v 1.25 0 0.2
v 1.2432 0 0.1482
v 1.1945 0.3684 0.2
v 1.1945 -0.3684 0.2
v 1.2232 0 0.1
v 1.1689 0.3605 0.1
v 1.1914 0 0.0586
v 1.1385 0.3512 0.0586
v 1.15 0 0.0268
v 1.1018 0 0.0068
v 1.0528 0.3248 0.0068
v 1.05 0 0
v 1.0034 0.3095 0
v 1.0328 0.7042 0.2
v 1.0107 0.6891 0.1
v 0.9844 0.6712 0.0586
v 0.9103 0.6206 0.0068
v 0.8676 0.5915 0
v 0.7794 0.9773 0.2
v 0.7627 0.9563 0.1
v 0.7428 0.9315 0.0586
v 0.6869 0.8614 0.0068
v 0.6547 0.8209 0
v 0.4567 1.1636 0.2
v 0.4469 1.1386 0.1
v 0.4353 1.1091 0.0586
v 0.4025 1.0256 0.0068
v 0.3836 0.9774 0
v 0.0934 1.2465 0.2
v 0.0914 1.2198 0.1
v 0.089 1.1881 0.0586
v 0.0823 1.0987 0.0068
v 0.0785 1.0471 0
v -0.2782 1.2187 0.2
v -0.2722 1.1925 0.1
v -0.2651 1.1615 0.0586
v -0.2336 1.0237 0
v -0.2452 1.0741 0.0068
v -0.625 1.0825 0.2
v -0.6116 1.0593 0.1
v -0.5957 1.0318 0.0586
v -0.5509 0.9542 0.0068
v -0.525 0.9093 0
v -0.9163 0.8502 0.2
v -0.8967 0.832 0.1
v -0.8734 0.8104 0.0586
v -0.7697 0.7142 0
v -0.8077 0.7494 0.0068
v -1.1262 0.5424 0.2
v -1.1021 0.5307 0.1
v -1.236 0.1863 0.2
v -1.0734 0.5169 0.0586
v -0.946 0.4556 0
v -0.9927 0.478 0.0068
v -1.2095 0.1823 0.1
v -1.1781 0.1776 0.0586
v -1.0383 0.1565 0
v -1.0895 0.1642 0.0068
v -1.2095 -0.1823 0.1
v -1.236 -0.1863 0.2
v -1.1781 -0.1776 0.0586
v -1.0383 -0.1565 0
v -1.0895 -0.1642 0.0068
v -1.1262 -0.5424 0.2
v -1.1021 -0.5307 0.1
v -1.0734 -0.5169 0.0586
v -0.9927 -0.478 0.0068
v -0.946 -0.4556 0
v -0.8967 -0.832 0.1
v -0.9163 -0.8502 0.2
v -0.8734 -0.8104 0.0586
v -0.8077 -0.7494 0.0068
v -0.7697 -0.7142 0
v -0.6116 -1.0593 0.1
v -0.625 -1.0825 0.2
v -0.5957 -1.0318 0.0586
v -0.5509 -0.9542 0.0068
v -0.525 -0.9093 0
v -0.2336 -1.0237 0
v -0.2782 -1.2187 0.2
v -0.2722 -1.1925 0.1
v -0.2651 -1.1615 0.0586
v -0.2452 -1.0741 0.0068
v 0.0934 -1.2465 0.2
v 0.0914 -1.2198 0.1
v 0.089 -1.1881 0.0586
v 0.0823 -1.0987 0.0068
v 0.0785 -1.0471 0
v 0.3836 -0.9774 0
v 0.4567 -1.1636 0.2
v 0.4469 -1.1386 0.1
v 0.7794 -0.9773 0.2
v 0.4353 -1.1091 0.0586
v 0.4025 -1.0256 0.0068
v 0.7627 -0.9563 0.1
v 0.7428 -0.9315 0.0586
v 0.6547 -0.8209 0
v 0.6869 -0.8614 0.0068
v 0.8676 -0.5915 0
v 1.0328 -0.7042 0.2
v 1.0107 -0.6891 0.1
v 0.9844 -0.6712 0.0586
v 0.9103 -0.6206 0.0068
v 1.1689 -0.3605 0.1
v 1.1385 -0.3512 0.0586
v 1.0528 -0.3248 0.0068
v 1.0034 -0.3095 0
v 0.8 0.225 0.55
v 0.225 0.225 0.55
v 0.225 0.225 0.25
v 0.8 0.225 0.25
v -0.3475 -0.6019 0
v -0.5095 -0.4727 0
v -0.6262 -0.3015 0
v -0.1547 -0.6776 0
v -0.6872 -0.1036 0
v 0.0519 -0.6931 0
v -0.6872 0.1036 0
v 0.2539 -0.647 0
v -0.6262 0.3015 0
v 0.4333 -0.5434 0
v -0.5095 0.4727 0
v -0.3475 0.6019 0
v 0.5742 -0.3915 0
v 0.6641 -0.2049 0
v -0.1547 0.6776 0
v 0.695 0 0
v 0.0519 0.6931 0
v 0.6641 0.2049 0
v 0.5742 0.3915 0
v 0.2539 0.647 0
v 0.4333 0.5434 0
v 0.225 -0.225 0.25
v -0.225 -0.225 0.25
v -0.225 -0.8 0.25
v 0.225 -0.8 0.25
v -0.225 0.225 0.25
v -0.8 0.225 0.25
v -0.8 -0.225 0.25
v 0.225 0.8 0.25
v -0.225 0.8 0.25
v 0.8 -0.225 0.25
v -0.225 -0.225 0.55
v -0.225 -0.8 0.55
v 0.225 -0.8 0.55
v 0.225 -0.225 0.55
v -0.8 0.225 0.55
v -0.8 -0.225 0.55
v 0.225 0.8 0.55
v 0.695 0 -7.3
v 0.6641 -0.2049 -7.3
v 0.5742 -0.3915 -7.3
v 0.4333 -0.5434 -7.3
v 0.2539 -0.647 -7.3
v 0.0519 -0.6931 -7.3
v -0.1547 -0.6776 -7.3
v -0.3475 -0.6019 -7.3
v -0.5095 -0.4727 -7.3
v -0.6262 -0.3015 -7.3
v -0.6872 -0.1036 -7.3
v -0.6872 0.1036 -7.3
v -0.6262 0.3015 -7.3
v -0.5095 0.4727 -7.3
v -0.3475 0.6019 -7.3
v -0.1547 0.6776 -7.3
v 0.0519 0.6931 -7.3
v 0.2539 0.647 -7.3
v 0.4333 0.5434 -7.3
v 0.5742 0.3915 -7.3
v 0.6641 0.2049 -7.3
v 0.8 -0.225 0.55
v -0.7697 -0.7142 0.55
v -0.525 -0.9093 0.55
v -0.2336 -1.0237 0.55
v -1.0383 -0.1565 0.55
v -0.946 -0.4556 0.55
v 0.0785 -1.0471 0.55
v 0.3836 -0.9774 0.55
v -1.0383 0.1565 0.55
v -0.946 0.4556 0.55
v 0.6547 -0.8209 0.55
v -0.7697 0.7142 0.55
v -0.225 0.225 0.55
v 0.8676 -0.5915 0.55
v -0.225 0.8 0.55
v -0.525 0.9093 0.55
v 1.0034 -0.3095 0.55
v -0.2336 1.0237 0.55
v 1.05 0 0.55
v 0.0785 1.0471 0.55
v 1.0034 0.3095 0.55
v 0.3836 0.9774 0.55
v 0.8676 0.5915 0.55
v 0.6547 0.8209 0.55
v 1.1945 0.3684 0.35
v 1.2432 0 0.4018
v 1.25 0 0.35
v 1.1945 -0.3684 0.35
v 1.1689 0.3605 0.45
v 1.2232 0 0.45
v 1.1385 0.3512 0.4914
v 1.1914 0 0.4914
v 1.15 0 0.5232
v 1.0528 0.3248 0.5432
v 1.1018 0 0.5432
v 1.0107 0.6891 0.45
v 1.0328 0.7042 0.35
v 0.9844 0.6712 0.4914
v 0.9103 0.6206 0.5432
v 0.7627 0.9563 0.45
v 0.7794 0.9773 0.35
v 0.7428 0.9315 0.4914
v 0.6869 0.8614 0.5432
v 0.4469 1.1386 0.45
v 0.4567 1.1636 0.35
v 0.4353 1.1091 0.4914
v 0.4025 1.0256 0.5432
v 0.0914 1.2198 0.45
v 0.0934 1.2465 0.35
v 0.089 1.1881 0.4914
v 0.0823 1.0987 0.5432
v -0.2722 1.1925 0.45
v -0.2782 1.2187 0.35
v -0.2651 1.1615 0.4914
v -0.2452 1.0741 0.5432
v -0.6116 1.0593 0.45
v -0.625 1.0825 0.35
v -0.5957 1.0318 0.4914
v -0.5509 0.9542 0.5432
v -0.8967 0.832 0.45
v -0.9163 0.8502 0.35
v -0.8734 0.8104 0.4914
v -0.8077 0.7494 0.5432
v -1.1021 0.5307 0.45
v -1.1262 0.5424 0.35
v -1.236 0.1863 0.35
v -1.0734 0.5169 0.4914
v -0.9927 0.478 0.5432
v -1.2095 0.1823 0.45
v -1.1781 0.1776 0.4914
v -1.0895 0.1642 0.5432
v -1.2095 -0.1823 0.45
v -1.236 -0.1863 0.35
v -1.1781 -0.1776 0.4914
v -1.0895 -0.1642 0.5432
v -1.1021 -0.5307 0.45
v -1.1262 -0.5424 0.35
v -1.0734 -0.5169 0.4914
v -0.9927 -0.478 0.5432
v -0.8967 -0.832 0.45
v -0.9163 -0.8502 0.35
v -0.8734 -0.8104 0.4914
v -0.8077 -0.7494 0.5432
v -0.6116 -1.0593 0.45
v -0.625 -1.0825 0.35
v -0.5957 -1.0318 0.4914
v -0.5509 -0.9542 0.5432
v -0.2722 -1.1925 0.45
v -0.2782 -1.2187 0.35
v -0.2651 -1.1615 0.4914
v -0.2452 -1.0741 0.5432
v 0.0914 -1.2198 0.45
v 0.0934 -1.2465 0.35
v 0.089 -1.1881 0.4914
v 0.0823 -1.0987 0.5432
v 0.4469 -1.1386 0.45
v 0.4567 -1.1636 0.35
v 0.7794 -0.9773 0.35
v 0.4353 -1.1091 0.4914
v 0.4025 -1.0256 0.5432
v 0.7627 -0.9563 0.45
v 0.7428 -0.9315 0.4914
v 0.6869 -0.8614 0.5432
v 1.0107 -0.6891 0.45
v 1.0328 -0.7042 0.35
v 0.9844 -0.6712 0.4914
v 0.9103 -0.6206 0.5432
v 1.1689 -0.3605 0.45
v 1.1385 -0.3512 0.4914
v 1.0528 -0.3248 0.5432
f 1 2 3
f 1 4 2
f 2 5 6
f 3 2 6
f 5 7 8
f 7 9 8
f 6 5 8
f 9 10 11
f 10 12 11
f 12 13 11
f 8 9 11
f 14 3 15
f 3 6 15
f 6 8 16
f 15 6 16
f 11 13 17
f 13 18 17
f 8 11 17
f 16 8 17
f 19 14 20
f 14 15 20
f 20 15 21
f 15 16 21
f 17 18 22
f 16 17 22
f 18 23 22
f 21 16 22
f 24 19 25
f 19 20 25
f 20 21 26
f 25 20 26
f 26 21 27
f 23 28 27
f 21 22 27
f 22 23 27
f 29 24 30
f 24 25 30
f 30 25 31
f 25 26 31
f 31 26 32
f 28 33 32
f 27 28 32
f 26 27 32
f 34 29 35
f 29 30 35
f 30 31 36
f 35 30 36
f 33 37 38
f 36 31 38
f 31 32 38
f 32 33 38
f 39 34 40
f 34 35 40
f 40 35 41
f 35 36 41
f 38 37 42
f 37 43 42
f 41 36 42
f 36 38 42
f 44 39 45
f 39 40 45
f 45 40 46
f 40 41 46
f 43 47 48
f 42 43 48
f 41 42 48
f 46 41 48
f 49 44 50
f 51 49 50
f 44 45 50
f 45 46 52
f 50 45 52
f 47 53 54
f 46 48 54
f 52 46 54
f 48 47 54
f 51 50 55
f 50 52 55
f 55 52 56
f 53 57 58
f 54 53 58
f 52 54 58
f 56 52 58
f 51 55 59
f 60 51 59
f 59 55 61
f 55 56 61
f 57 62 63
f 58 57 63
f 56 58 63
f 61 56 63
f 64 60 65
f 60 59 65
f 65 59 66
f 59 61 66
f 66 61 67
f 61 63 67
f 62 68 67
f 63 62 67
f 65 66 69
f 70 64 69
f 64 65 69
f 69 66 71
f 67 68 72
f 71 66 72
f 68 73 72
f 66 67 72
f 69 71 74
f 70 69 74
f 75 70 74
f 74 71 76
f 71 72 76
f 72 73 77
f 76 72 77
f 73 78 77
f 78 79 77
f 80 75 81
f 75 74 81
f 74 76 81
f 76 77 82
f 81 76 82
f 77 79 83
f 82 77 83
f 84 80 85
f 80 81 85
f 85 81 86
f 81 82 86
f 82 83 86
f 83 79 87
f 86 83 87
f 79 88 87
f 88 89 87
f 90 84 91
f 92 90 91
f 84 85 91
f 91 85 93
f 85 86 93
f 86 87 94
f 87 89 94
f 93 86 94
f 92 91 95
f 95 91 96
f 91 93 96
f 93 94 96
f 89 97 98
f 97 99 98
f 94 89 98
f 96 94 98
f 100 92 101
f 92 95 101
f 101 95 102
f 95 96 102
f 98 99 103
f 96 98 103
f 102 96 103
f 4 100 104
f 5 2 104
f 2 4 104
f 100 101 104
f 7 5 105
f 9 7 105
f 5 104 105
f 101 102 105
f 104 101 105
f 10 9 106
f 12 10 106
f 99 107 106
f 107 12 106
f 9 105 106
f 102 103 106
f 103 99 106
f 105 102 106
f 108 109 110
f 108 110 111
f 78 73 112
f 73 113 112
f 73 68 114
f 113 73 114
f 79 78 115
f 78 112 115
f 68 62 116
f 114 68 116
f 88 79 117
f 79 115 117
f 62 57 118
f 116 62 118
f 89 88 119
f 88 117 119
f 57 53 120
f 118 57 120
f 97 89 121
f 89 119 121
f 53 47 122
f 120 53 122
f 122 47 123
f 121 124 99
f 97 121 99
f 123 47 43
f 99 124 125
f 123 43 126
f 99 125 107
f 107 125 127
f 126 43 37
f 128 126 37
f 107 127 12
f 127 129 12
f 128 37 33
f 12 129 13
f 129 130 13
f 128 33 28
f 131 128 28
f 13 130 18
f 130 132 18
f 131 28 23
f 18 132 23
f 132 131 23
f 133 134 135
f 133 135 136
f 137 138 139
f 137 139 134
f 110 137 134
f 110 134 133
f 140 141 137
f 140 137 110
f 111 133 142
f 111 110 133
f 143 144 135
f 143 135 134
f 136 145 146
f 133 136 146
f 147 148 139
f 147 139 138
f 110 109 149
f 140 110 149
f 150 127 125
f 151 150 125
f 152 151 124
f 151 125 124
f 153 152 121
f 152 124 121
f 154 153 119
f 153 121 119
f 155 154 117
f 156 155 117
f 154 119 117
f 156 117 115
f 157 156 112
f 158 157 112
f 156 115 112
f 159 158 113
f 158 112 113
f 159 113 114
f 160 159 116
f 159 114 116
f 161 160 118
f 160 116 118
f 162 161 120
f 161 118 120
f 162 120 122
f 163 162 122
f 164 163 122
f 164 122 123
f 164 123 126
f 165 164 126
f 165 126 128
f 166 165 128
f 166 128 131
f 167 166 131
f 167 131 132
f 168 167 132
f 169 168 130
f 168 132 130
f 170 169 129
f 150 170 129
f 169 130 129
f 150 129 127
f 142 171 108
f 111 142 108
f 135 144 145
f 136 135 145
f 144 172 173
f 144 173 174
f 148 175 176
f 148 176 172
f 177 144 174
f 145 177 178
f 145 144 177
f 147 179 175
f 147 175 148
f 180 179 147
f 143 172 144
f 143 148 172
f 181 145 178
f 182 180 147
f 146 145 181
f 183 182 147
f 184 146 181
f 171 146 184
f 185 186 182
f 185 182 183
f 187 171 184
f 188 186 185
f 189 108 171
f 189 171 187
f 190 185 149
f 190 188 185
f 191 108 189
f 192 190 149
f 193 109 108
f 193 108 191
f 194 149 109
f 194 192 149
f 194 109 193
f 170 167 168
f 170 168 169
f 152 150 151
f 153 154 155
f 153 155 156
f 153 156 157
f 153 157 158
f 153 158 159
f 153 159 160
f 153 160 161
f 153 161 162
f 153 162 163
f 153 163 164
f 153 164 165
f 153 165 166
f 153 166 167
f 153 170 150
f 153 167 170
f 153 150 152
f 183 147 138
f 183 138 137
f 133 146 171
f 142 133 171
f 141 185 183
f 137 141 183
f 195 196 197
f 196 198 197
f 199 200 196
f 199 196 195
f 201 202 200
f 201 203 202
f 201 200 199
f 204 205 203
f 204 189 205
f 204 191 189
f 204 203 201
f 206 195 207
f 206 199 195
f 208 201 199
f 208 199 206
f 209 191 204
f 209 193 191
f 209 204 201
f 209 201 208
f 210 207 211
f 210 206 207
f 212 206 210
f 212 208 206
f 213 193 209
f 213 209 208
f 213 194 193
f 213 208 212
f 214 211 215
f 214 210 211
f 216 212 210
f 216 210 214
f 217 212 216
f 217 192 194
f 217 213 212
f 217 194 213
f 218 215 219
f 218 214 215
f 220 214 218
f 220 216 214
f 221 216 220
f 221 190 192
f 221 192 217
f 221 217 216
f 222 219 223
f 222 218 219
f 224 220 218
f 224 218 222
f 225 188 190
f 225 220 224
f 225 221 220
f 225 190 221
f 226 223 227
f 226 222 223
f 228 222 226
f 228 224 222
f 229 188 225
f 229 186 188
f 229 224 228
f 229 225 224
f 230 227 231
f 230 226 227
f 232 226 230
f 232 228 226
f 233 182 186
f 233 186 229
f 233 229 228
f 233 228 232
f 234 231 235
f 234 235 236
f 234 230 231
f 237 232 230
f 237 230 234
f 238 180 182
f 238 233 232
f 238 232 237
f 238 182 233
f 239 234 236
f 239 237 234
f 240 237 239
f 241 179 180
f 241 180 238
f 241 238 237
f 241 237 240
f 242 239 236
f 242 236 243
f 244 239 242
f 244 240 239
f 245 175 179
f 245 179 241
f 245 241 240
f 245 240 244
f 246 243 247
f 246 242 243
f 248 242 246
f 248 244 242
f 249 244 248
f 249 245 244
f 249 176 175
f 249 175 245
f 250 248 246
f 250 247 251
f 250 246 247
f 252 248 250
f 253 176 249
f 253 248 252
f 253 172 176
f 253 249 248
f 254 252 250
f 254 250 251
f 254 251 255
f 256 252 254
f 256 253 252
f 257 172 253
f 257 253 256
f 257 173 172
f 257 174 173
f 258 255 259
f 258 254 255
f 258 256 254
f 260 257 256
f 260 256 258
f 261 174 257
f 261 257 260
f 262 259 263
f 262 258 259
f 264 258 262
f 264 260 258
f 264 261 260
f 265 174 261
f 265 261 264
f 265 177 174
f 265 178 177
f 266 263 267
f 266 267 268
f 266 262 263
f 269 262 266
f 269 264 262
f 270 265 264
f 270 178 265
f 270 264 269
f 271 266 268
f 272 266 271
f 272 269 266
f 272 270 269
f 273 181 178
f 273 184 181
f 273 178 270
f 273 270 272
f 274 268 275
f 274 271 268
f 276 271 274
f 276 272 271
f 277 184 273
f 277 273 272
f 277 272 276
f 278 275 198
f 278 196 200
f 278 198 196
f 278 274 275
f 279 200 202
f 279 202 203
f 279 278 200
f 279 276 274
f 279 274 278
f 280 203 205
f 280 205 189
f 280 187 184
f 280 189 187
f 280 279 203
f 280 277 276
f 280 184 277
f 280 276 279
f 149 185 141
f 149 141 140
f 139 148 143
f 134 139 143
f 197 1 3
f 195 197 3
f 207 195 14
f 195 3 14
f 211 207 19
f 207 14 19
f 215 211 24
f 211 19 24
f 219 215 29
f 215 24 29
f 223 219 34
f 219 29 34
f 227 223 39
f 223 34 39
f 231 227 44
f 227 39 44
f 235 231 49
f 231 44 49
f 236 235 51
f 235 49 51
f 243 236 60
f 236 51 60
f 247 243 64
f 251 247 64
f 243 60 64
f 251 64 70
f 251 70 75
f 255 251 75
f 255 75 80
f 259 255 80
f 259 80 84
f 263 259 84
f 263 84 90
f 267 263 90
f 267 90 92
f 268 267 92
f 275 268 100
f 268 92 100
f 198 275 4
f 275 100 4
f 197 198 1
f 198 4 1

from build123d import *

# Parameters (mm, degrees)
F0_R     = 1.25
F1_DEPTH = 0.55
F2_R     = 0.695
F3_DEPTH = 7.3
F4_W     = 0.45
F4_H     = 0.45
F4_H_2   = 0.575
F4_W_2   = 0.575
F5_DEPTH = 0.3
F6_R     = 0.2


with BuildPart() as f1:
    # F0 (on Top) → F1 (new body)
    with BuildSketch(Plane.XY):
        Circle(F0_R)
    extrude(amount=F1_DEPTH)

    # F2 (on face) → F3 (join)
    with BuildSketch(Plane(origin=(0, 0, 0), x_dir=(1, 0, 0), z_dir=(0, 0, -1))):
        Circle(F2_R)
    extrude(amount=F3_DEPTH)

    # F4 (on face) → F5 (cut)
    with BuildSketch(Plane.XY.offset(0.55)):
        Rectangle(F4_W, F4_H)
        with Locations((0, 0.5125)):
            Rectangle(F4_W, F4_H_2)
        with Locations((-0.5125, 0)):
            Rectangle(F4_W_2, F4_H)
        with Locations((0, -0.5125)):
            Rectangle(F4_W, F4_H_2)
        with Locations((0.5125, 0)):
            Rectangle(F4_W_2, F4_H)
    extrude(amount=-F5_DEPTH, mode=Mode.SUBTRACT)

    # F6
    f6_edges = [f1.edges().sort_by_distance(p)[0] for p in [
        (-1.25, 0, 0.55),
        (-1.25, 0, 0),
    ]]
    fillet(f6_edges, radius=F6_R)


solid = f1.part
